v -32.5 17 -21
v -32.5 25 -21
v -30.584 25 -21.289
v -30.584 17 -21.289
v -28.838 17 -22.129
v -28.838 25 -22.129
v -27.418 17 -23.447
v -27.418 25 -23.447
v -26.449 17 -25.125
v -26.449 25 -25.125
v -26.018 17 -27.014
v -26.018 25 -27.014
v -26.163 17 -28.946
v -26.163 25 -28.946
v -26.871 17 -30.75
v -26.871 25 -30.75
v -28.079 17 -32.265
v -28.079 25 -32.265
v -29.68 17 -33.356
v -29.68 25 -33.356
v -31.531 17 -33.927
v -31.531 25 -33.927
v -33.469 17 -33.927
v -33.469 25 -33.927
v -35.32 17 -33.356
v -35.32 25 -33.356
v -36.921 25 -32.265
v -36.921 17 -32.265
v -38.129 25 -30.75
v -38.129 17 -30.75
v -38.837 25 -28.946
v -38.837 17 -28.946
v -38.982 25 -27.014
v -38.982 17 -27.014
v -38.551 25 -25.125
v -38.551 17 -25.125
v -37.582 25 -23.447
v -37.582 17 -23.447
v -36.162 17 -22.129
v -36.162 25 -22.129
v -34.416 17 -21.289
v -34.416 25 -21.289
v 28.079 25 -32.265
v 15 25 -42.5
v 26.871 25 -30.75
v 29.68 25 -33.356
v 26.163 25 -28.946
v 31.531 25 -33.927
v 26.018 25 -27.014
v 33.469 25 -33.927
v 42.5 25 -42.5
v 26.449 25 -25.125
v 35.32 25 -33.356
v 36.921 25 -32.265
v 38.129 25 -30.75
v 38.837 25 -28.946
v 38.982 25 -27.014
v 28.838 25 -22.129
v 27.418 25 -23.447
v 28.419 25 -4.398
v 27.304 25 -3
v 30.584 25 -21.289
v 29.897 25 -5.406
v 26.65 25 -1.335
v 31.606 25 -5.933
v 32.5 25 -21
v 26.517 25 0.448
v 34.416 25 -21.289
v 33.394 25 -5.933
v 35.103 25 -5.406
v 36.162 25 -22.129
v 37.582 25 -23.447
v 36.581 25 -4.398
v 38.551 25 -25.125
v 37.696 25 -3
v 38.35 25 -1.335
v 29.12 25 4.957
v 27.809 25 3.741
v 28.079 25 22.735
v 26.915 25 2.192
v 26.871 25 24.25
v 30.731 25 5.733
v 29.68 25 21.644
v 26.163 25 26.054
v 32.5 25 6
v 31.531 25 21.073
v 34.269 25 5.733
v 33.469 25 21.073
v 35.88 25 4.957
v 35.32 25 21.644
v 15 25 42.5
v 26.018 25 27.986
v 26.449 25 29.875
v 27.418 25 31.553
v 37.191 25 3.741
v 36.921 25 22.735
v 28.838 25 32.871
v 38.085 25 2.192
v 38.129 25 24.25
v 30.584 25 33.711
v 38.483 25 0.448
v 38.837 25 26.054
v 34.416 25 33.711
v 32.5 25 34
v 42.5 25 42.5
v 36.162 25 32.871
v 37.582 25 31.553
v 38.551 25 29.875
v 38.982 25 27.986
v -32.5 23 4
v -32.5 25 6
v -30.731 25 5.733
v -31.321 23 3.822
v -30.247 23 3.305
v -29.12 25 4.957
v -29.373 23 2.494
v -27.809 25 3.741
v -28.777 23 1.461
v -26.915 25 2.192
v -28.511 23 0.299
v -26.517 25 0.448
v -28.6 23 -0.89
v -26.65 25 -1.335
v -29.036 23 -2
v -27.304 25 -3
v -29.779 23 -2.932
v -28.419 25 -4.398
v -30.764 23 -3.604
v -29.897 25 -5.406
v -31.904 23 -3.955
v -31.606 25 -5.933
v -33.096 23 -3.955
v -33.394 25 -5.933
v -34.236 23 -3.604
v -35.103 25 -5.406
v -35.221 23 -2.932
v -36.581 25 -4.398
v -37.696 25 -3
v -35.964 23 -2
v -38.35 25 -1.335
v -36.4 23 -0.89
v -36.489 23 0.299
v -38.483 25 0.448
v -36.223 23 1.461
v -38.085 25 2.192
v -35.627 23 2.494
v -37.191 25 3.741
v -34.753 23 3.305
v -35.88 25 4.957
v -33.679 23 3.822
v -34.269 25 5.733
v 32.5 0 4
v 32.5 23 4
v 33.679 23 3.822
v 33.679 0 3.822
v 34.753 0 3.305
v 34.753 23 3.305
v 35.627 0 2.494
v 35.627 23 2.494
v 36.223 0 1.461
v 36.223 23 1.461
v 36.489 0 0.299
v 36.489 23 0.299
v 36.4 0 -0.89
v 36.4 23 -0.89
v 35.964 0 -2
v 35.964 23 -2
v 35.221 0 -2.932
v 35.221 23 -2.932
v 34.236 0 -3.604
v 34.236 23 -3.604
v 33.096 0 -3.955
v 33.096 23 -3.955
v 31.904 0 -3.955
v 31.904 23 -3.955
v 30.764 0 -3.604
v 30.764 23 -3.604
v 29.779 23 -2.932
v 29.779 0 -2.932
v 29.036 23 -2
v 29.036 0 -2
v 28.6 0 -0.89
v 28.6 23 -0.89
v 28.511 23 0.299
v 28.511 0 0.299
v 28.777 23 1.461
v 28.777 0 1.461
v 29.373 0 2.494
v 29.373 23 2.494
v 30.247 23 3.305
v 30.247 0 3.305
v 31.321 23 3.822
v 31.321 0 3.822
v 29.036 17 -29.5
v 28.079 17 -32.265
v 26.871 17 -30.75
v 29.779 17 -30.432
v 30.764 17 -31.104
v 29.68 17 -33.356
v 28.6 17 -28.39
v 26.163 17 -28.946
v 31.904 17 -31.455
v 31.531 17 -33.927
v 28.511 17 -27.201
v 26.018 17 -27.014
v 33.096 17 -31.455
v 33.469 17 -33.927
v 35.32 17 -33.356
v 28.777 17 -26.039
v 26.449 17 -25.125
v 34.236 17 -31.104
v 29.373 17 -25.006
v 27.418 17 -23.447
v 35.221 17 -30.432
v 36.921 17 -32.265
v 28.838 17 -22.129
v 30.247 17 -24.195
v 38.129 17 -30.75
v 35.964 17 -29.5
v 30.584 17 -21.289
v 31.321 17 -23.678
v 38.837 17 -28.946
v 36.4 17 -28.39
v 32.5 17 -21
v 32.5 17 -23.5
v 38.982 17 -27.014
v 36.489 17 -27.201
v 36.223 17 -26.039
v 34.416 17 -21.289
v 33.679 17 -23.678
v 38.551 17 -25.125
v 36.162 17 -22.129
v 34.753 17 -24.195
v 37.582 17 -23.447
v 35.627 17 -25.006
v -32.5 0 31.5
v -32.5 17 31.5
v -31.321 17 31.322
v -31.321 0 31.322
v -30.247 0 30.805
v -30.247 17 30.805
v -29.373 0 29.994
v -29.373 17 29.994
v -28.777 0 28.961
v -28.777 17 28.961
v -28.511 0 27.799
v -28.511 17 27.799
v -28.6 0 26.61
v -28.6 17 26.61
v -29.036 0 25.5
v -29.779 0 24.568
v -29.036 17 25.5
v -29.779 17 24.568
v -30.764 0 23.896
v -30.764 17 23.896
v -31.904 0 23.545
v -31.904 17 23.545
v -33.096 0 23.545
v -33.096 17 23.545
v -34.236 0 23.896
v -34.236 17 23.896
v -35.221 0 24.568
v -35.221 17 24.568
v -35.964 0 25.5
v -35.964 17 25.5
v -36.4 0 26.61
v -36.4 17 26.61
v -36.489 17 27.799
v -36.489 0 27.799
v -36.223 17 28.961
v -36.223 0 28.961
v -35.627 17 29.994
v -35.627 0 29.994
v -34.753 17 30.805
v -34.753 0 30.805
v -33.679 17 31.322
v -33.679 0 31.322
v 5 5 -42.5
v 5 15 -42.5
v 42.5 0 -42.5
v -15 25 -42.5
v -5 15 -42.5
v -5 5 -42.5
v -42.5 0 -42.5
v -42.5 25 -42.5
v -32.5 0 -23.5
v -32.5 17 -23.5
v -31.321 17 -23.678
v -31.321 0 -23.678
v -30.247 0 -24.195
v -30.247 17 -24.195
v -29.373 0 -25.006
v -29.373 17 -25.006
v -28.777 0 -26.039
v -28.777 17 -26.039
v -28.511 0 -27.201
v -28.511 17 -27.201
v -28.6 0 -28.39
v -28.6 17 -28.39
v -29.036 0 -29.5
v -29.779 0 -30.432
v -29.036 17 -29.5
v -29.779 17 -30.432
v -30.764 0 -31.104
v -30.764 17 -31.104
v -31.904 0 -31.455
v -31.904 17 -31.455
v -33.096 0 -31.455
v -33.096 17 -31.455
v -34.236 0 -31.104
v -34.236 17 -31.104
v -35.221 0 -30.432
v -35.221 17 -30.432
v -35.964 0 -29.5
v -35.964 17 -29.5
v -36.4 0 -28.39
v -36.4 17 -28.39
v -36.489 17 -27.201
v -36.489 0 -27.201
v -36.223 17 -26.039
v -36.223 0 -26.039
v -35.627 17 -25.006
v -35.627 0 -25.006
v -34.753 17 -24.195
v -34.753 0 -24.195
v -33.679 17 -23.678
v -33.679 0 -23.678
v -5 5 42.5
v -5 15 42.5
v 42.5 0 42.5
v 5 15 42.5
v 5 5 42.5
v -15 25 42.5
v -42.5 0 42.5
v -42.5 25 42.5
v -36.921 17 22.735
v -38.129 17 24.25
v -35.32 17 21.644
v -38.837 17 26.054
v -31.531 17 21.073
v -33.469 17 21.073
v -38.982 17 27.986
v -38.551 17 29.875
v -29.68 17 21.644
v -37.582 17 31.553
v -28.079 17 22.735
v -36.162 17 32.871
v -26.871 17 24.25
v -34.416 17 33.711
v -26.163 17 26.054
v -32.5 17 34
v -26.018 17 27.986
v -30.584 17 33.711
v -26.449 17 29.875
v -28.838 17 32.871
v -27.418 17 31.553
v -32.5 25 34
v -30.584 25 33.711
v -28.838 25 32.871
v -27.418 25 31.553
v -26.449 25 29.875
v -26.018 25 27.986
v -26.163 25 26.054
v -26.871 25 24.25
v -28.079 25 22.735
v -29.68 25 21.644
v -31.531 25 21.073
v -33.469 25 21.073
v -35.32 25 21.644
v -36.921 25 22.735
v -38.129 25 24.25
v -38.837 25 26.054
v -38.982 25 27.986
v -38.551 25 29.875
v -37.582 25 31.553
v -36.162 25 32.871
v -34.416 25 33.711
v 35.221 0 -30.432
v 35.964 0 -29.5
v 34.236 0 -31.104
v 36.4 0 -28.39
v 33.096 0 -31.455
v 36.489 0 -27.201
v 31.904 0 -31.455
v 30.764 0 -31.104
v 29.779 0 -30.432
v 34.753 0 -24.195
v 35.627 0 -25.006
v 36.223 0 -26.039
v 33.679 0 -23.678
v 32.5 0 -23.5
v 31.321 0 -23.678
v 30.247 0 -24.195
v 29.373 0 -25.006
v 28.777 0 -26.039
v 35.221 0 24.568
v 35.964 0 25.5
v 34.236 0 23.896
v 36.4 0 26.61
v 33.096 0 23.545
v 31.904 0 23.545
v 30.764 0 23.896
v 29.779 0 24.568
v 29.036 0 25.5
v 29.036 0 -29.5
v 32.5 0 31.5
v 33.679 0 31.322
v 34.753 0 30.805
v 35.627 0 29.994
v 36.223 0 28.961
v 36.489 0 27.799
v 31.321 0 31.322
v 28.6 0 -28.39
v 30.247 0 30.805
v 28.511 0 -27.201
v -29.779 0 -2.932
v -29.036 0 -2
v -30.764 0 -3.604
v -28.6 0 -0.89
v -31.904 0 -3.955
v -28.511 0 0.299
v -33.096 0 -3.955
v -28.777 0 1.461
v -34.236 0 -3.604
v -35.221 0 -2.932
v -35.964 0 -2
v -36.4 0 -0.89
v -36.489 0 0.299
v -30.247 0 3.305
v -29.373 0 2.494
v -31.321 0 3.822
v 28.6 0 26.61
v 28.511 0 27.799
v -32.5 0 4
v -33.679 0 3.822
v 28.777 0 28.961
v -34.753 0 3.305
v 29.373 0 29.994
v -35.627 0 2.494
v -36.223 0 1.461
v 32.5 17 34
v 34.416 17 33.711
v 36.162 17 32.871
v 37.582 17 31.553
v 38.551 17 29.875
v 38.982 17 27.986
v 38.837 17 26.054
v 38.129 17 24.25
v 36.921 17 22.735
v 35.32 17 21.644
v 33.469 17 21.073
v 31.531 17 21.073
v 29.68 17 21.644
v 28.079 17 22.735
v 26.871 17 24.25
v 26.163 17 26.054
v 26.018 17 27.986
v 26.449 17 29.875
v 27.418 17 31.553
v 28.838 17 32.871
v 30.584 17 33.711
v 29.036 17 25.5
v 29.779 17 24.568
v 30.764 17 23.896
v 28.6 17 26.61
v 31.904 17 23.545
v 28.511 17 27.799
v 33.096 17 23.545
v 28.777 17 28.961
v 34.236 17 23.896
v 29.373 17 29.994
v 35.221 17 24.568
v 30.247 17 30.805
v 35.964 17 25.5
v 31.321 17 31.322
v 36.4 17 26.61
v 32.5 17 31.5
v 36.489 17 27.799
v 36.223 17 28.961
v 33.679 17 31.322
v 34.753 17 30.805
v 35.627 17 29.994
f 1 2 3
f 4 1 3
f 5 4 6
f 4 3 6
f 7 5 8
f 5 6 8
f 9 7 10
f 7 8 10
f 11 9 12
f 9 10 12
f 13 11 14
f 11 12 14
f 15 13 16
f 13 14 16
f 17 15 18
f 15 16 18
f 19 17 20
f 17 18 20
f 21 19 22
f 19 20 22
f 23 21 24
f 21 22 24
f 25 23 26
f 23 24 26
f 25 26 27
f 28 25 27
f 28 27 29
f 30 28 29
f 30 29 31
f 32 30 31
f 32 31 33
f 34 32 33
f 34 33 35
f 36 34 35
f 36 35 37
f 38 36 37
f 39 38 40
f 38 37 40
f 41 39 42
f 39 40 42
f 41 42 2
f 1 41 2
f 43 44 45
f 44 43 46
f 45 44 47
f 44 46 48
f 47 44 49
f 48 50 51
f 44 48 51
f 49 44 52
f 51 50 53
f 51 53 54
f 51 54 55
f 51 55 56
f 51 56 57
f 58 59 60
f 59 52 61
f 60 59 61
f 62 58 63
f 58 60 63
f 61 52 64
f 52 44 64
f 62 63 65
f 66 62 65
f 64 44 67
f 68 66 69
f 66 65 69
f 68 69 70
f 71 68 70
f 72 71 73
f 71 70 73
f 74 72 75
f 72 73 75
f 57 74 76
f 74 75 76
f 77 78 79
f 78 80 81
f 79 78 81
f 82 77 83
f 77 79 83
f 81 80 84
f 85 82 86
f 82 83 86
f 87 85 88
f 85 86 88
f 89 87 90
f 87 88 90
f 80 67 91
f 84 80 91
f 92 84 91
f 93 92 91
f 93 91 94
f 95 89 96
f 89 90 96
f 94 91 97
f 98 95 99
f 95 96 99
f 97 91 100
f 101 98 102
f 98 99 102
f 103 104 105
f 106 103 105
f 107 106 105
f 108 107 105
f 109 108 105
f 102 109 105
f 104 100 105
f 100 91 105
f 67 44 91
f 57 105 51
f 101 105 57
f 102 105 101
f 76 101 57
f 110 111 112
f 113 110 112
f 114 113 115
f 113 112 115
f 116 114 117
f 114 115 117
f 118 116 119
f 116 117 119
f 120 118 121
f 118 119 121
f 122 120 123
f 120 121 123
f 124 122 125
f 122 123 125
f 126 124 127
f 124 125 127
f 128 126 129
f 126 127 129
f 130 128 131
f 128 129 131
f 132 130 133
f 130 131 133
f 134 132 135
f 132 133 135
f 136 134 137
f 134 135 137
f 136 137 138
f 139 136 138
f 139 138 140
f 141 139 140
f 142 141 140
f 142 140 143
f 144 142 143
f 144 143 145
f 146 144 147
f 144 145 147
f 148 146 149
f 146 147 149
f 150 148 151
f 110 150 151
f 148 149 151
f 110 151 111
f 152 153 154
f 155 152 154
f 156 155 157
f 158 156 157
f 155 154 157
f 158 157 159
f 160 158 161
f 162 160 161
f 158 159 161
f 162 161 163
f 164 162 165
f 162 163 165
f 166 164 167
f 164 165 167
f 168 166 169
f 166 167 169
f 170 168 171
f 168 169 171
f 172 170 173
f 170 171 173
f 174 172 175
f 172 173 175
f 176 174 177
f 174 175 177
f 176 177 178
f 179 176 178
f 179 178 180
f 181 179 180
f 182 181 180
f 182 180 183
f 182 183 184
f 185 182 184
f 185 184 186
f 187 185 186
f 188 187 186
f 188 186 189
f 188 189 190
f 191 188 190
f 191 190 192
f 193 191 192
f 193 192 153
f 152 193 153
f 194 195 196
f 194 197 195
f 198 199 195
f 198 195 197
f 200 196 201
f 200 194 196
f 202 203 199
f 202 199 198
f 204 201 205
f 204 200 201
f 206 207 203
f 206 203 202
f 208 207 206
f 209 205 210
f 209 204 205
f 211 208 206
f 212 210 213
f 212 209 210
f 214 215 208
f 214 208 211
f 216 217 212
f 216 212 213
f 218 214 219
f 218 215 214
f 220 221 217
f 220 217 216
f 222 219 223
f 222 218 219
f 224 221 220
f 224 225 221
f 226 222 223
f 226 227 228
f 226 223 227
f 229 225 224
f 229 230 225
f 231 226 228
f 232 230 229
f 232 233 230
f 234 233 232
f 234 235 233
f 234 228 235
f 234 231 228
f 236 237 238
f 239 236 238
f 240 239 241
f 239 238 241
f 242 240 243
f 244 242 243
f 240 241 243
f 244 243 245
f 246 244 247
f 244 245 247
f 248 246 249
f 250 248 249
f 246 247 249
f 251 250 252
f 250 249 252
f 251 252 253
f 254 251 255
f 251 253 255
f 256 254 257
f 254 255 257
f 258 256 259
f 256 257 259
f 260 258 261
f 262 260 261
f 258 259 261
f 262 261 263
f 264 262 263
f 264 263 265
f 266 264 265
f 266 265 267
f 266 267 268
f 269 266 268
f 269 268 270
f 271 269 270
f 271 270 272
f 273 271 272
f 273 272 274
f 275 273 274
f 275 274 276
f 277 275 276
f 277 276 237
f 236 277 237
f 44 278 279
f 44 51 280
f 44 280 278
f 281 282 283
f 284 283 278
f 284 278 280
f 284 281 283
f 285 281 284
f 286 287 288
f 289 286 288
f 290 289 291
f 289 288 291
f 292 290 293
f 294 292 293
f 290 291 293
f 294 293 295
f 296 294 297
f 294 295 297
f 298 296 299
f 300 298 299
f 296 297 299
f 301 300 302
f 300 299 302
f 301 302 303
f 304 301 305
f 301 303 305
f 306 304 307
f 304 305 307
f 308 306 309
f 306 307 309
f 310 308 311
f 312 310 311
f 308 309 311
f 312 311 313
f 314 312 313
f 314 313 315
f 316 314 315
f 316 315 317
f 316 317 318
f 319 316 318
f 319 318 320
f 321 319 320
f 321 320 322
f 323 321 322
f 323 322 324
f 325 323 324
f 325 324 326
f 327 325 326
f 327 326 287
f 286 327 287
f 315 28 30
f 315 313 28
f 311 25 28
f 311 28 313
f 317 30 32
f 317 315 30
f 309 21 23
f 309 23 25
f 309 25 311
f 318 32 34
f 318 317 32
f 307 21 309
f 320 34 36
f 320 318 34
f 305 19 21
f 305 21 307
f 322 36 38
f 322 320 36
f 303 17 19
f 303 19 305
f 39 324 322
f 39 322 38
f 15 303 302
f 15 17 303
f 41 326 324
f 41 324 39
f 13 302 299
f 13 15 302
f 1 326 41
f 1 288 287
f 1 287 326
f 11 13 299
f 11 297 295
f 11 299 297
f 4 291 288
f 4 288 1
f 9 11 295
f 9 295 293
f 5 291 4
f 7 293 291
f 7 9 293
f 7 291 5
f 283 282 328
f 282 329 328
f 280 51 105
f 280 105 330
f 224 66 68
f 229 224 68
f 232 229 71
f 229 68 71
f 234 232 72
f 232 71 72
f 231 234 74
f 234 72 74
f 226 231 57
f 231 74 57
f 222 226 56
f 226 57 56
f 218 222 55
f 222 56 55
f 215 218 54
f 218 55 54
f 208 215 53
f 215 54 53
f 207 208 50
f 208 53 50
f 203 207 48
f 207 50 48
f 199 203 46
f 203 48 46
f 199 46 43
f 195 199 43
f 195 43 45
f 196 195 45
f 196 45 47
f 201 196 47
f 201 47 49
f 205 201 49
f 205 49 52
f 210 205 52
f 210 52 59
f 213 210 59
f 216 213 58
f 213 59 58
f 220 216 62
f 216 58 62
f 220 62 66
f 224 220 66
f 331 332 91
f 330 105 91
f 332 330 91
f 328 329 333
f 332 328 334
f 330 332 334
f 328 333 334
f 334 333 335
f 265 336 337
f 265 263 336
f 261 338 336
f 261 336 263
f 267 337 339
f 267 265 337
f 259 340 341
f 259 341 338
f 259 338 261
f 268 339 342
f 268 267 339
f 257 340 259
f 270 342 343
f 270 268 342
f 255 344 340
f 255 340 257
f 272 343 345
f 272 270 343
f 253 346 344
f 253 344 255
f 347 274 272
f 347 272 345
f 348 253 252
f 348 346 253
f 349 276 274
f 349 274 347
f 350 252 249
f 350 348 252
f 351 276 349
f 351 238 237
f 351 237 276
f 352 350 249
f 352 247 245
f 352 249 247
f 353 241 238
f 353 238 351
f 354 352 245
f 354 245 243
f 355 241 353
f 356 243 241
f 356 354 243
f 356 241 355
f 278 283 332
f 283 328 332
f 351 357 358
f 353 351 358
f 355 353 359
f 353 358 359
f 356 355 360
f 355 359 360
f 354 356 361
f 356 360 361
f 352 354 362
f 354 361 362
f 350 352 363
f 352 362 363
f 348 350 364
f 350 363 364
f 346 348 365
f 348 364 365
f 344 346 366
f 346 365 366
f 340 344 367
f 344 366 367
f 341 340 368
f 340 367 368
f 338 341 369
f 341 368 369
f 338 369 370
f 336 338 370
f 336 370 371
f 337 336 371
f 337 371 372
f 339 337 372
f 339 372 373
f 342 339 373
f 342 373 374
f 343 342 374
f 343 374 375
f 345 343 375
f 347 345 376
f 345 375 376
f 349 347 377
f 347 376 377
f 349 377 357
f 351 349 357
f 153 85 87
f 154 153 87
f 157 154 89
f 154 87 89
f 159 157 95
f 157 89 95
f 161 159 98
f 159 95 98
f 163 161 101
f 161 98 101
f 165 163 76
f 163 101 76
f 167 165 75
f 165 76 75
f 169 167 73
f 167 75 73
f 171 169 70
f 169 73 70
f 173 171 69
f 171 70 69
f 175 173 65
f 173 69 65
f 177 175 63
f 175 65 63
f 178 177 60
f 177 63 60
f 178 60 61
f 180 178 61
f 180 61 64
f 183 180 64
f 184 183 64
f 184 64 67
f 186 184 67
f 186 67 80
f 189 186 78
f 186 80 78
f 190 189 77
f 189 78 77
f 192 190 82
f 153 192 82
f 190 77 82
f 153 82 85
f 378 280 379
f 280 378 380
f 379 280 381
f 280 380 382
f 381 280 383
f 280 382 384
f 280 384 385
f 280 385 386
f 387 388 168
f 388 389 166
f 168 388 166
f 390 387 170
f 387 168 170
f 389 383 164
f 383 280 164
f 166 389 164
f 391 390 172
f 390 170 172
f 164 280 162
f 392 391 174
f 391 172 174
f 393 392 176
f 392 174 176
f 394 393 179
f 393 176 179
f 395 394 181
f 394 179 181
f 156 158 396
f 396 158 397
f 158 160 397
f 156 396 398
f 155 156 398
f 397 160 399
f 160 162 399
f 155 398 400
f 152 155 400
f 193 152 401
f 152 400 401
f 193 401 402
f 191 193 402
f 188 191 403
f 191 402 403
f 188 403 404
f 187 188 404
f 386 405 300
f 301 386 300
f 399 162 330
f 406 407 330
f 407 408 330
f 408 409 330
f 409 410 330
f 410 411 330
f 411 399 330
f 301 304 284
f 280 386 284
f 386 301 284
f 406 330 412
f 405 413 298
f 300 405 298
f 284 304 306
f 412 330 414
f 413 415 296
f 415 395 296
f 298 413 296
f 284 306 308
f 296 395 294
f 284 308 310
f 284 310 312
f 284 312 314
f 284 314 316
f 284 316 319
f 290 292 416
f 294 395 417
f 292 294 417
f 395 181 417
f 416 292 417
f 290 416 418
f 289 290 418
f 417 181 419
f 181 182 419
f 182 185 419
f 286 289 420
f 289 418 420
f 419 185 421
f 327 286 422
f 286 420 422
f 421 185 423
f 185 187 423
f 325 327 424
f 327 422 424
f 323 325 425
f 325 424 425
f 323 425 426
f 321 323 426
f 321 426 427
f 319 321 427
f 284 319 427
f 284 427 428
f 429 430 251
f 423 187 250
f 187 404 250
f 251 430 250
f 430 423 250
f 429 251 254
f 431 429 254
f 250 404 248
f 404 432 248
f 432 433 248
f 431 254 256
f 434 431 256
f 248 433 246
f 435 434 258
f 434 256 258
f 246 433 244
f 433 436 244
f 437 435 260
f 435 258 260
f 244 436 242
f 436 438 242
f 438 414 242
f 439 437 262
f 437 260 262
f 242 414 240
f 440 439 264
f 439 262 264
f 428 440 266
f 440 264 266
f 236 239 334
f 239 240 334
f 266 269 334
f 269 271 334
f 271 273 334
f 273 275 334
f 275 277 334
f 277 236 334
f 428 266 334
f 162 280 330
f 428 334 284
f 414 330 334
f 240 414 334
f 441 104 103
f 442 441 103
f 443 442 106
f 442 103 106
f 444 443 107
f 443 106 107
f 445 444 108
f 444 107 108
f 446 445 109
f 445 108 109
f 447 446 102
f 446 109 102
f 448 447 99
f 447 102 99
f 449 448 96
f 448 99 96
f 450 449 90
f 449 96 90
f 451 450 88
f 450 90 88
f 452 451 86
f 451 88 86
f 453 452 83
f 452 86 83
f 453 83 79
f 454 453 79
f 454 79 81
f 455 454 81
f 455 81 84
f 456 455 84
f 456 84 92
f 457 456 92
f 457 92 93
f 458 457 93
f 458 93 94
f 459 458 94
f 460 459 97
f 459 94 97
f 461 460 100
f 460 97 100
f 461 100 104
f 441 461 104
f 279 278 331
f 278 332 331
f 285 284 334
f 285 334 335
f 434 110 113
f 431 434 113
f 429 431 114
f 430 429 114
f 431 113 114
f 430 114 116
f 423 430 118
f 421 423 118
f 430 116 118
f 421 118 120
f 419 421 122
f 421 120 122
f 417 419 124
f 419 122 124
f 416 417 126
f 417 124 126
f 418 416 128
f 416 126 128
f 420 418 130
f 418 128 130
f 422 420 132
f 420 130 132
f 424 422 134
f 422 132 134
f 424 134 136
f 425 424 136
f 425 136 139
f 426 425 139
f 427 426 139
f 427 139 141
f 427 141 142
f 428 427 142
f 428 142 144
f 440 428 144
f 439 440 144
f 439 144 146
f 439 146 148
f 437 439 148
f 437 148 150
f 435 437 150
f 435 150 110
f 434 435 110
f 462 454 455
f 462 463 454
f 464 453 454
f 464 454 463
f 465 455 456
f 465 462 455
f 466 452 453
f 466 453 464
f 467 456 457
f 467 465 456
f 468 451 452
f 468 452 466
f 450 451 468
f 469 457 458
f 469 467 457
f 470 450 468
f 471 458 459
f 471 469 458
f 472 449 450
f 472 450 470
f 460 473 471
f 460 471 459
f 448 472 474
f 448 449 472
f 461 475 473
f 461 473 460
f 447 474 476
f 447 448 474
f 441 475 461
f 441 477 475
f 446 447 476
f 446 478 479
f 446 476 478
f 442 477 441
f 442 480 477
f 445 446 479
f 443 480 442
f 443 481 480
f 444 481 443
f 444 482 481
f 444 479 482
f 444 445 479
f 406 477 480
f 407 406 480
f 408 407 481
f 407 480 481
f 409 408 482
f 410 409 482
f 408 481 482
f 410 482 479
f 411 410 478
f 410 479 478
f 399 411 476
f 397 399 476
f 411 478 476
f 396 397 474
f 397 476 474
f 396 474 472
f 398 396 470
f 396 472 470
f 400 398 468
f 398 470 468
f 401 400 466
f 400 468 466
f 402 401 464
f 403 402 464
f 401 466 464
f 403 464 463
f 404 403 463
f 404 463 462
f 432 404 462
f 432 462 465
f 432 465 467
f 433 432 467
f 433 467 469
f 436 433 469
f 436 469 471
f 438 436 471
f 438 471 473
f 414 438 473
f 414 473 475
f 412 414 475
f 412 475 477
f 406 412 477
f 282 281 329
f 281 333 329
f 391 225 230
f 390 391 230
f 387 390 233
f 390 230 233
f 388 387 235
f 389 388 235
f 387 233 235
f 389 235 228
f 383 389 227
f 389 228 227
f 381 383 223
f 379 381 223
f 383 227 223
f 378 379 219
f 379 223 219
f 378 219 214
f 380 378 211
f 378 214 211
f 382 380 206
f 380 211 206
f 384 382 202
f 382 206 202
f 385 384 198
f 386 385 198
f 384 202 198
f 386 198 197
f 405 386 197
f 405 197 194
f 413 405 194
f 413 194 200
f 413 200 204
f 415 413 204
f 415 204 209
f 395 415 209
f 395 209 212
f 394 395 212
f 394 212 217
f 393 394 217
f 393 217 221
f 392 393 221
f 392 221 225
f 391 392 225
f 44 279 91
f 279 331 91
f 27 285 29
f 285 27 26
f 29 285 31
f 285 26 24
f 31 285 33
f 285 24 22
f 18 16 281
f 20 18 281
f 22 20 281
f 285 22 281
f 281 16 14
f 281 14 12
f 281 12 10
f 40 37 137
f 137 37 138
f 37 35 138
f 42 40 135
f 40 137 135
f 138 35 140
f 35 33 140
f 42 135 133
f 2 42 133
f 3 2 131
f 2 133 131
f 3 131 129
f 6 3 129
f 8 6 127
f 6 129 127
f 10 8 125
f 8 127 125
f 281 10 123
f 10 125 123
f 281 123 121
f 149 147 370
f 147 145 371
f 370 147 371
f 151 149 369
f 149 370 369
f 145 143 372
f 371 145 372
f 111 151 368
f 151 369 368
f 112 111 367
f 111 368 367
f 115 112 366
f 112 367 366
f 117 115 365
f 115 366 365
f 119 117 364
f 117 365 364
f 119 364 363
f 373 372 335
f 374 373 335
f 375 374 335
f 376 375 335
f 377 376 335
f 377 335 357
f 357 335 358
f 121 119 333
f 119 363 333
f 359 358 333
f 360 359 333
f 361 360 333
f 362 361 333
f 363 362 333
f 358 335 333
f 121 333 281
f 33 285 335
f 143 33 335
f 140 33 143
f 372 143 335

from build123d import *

# Parameters (mm, degrees)
EXTRUDE_1_DEPTH     = 42.5
SKETCH_2_R          = 6.5
CUT_EXTRUDE_1_DEPTH = 8
SKETCH_3_R          = 4
CUT_EXTRUDE_2_DEPTH = 66.096082831
CHAMFER_1_SIZE      = 2


with BuildPart() as part:
    # Эскиз1 → Бобышка-Вытянуть1 (new, symmetric)
    with BuildSketch(Plane.XY):
        Polygon((42.5, 0), (-42.5, 0), (-42.5, 25), (-15, 25), (-5, 15), (-5, 5), (5, 5), (5, 15), (15, 25), (42.5, 25), align=None)
    extrude(amount=EXTRUDE_1_DEPTH, both=True)

    # Эскиз2 → Вырез-Вытянуть1 (cut)
    with BuildSketch(Plane(origin=(0, 25, 0), x_dir=(1, 0, 0), z_dir=(0, 1, 0))):
        with Locations(Location((-32.5, 27.5, 0), (0, 0, 270))):
            Circle(SKETCH_2_R)
        with Locations(Location((-32.5, -27.5, 0), (0, 0, 270))):
            Circle(SKETCH_2_R)
        with Locations(Location((32.5, -27.5, 0), (0, 0, 270))):
            Circle(SKETCH_2_R)
        with Locations(Location((32.5, 27.5, 0), (0, 0, 270))):
            Circle(SKETCH_2_R)
    extrude(amount=-CUT_EXTRUDE_1_DEPTH, mode=Mode.SUBTRACT)

    # Эскиз3 → Вырез-Вытянуть2 (cut, through all)
    with BuildSketch(Plane(origin=(0, 25, 0), x_dir=(1, 0, 0), z_dir=(0, 1, 0))):
        with Locations(Location((-32.5, 0, 0), (0, 0, 270))):
            Circle(SKETCH_3_R)
        with Locations(Location((-32.5, 27.5, 0), (0, 0, 270))):
            Circle(SKETCH_3_R)
        with Locations(Location((32.5, 27.5, 0), (0, 0, 270))):
            Circle(SKETCH_3_R)
        with Locations(Location((32.5, 0, 0), (0, 0, 270))):
            Circle(SKETCH_3_R)
        with Locations(Location((32.5, -27.5, 0), (0, 0, 270))):
            Circle(SKETCH_3_R)
        with Locations(Location((-32.5, -27.5, 0), (0, 0, 270))):
            Circle(SKETCH_3_R)
    extrude(amount=-CUT_EXTRUDE_2_DEPTH, mode=Mode.SUBTRACT)

    # Фаска1
    chamfer_1_edges = [part.edges().sort_by_distance(p)[0] for p in [
        (-32.5, 25, -4),
        (32.5, 25, -4),
    ]]
    chamfer(chamfer_1_edges, length=CHAMFER_1_SIZE)


solid = part.part
